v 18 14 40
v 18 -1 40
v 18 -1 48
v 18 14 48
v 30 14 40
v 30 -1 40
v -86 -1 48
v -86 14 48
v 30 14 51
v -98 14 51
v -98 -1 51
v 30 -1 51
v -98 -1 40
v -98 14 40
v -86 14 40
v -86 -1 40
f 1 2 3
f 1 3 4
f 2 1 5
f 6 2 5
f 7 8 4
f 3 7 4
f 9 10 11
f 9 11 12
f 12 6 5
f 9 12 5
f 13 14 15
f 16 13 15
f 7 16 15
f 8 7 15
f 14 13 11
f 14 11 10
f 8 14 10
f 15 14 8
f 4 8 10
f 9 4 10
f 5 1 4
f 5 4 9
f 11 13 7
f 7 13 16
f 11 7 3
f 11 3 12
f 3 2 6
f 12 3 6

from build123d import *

# Parameters (mm, degrees)
BOX501_W     = 128
BOX501_H     = 15
BOX501_DEPTH = 3
BOX502_W     = 12
BOX502_H     = 15
BOX502_DEPTH = 11
BOX503_W     = 12
BOX503_H     = 15
BOX503_DEPTH = 11


with BuildPart() as box501:
    # Box501 → Box501 (new body)
    with BuildSketch(Plane(origin=(-98, -27, 48), x_dir=(1, 0, 0), z_dir=(0, 0, 1))):
        with Locations((64, 7.5)):
            Rectangle(BOX501_W, BOX501_H)
    extrude(amount=BOX501_DEPTH)


with BuildPart() as box502:
    # Box502 → Box502 (new body)
    with BuildSketch(Plane(origin=(-98, -27, 40), x_dir=(1, 0, 0), z_dir=(0, 0, 1))):
        with Locations((6, 7.5)):
            Rectangle(BOX502_W, BOX502_H)
    extrude(amount=BOX502_DEPTH)


with BuildPart() as fusion392:
    # Box503 → Box503 (new body)
    with BuildSketch(Plane(origin=(18, -27, 40), x_dir=(1, 0, 0), z_dir=(0, 0, 1))):
        with Locations((6, 7.5)):
            Rectangle(BOX503_W, BOX503_H)
    extrude(amount=BOX503_DEPTH)

    # Fusion392: union Box501, Box502
    add(box501.part)
    add(box502.part)


with BuildPart() as fusion392_1:
    # Fusion392 placement: moved
    add(fusion392.part.moved(Location((0, 26, 0))))


solid = fusion392_1.part
